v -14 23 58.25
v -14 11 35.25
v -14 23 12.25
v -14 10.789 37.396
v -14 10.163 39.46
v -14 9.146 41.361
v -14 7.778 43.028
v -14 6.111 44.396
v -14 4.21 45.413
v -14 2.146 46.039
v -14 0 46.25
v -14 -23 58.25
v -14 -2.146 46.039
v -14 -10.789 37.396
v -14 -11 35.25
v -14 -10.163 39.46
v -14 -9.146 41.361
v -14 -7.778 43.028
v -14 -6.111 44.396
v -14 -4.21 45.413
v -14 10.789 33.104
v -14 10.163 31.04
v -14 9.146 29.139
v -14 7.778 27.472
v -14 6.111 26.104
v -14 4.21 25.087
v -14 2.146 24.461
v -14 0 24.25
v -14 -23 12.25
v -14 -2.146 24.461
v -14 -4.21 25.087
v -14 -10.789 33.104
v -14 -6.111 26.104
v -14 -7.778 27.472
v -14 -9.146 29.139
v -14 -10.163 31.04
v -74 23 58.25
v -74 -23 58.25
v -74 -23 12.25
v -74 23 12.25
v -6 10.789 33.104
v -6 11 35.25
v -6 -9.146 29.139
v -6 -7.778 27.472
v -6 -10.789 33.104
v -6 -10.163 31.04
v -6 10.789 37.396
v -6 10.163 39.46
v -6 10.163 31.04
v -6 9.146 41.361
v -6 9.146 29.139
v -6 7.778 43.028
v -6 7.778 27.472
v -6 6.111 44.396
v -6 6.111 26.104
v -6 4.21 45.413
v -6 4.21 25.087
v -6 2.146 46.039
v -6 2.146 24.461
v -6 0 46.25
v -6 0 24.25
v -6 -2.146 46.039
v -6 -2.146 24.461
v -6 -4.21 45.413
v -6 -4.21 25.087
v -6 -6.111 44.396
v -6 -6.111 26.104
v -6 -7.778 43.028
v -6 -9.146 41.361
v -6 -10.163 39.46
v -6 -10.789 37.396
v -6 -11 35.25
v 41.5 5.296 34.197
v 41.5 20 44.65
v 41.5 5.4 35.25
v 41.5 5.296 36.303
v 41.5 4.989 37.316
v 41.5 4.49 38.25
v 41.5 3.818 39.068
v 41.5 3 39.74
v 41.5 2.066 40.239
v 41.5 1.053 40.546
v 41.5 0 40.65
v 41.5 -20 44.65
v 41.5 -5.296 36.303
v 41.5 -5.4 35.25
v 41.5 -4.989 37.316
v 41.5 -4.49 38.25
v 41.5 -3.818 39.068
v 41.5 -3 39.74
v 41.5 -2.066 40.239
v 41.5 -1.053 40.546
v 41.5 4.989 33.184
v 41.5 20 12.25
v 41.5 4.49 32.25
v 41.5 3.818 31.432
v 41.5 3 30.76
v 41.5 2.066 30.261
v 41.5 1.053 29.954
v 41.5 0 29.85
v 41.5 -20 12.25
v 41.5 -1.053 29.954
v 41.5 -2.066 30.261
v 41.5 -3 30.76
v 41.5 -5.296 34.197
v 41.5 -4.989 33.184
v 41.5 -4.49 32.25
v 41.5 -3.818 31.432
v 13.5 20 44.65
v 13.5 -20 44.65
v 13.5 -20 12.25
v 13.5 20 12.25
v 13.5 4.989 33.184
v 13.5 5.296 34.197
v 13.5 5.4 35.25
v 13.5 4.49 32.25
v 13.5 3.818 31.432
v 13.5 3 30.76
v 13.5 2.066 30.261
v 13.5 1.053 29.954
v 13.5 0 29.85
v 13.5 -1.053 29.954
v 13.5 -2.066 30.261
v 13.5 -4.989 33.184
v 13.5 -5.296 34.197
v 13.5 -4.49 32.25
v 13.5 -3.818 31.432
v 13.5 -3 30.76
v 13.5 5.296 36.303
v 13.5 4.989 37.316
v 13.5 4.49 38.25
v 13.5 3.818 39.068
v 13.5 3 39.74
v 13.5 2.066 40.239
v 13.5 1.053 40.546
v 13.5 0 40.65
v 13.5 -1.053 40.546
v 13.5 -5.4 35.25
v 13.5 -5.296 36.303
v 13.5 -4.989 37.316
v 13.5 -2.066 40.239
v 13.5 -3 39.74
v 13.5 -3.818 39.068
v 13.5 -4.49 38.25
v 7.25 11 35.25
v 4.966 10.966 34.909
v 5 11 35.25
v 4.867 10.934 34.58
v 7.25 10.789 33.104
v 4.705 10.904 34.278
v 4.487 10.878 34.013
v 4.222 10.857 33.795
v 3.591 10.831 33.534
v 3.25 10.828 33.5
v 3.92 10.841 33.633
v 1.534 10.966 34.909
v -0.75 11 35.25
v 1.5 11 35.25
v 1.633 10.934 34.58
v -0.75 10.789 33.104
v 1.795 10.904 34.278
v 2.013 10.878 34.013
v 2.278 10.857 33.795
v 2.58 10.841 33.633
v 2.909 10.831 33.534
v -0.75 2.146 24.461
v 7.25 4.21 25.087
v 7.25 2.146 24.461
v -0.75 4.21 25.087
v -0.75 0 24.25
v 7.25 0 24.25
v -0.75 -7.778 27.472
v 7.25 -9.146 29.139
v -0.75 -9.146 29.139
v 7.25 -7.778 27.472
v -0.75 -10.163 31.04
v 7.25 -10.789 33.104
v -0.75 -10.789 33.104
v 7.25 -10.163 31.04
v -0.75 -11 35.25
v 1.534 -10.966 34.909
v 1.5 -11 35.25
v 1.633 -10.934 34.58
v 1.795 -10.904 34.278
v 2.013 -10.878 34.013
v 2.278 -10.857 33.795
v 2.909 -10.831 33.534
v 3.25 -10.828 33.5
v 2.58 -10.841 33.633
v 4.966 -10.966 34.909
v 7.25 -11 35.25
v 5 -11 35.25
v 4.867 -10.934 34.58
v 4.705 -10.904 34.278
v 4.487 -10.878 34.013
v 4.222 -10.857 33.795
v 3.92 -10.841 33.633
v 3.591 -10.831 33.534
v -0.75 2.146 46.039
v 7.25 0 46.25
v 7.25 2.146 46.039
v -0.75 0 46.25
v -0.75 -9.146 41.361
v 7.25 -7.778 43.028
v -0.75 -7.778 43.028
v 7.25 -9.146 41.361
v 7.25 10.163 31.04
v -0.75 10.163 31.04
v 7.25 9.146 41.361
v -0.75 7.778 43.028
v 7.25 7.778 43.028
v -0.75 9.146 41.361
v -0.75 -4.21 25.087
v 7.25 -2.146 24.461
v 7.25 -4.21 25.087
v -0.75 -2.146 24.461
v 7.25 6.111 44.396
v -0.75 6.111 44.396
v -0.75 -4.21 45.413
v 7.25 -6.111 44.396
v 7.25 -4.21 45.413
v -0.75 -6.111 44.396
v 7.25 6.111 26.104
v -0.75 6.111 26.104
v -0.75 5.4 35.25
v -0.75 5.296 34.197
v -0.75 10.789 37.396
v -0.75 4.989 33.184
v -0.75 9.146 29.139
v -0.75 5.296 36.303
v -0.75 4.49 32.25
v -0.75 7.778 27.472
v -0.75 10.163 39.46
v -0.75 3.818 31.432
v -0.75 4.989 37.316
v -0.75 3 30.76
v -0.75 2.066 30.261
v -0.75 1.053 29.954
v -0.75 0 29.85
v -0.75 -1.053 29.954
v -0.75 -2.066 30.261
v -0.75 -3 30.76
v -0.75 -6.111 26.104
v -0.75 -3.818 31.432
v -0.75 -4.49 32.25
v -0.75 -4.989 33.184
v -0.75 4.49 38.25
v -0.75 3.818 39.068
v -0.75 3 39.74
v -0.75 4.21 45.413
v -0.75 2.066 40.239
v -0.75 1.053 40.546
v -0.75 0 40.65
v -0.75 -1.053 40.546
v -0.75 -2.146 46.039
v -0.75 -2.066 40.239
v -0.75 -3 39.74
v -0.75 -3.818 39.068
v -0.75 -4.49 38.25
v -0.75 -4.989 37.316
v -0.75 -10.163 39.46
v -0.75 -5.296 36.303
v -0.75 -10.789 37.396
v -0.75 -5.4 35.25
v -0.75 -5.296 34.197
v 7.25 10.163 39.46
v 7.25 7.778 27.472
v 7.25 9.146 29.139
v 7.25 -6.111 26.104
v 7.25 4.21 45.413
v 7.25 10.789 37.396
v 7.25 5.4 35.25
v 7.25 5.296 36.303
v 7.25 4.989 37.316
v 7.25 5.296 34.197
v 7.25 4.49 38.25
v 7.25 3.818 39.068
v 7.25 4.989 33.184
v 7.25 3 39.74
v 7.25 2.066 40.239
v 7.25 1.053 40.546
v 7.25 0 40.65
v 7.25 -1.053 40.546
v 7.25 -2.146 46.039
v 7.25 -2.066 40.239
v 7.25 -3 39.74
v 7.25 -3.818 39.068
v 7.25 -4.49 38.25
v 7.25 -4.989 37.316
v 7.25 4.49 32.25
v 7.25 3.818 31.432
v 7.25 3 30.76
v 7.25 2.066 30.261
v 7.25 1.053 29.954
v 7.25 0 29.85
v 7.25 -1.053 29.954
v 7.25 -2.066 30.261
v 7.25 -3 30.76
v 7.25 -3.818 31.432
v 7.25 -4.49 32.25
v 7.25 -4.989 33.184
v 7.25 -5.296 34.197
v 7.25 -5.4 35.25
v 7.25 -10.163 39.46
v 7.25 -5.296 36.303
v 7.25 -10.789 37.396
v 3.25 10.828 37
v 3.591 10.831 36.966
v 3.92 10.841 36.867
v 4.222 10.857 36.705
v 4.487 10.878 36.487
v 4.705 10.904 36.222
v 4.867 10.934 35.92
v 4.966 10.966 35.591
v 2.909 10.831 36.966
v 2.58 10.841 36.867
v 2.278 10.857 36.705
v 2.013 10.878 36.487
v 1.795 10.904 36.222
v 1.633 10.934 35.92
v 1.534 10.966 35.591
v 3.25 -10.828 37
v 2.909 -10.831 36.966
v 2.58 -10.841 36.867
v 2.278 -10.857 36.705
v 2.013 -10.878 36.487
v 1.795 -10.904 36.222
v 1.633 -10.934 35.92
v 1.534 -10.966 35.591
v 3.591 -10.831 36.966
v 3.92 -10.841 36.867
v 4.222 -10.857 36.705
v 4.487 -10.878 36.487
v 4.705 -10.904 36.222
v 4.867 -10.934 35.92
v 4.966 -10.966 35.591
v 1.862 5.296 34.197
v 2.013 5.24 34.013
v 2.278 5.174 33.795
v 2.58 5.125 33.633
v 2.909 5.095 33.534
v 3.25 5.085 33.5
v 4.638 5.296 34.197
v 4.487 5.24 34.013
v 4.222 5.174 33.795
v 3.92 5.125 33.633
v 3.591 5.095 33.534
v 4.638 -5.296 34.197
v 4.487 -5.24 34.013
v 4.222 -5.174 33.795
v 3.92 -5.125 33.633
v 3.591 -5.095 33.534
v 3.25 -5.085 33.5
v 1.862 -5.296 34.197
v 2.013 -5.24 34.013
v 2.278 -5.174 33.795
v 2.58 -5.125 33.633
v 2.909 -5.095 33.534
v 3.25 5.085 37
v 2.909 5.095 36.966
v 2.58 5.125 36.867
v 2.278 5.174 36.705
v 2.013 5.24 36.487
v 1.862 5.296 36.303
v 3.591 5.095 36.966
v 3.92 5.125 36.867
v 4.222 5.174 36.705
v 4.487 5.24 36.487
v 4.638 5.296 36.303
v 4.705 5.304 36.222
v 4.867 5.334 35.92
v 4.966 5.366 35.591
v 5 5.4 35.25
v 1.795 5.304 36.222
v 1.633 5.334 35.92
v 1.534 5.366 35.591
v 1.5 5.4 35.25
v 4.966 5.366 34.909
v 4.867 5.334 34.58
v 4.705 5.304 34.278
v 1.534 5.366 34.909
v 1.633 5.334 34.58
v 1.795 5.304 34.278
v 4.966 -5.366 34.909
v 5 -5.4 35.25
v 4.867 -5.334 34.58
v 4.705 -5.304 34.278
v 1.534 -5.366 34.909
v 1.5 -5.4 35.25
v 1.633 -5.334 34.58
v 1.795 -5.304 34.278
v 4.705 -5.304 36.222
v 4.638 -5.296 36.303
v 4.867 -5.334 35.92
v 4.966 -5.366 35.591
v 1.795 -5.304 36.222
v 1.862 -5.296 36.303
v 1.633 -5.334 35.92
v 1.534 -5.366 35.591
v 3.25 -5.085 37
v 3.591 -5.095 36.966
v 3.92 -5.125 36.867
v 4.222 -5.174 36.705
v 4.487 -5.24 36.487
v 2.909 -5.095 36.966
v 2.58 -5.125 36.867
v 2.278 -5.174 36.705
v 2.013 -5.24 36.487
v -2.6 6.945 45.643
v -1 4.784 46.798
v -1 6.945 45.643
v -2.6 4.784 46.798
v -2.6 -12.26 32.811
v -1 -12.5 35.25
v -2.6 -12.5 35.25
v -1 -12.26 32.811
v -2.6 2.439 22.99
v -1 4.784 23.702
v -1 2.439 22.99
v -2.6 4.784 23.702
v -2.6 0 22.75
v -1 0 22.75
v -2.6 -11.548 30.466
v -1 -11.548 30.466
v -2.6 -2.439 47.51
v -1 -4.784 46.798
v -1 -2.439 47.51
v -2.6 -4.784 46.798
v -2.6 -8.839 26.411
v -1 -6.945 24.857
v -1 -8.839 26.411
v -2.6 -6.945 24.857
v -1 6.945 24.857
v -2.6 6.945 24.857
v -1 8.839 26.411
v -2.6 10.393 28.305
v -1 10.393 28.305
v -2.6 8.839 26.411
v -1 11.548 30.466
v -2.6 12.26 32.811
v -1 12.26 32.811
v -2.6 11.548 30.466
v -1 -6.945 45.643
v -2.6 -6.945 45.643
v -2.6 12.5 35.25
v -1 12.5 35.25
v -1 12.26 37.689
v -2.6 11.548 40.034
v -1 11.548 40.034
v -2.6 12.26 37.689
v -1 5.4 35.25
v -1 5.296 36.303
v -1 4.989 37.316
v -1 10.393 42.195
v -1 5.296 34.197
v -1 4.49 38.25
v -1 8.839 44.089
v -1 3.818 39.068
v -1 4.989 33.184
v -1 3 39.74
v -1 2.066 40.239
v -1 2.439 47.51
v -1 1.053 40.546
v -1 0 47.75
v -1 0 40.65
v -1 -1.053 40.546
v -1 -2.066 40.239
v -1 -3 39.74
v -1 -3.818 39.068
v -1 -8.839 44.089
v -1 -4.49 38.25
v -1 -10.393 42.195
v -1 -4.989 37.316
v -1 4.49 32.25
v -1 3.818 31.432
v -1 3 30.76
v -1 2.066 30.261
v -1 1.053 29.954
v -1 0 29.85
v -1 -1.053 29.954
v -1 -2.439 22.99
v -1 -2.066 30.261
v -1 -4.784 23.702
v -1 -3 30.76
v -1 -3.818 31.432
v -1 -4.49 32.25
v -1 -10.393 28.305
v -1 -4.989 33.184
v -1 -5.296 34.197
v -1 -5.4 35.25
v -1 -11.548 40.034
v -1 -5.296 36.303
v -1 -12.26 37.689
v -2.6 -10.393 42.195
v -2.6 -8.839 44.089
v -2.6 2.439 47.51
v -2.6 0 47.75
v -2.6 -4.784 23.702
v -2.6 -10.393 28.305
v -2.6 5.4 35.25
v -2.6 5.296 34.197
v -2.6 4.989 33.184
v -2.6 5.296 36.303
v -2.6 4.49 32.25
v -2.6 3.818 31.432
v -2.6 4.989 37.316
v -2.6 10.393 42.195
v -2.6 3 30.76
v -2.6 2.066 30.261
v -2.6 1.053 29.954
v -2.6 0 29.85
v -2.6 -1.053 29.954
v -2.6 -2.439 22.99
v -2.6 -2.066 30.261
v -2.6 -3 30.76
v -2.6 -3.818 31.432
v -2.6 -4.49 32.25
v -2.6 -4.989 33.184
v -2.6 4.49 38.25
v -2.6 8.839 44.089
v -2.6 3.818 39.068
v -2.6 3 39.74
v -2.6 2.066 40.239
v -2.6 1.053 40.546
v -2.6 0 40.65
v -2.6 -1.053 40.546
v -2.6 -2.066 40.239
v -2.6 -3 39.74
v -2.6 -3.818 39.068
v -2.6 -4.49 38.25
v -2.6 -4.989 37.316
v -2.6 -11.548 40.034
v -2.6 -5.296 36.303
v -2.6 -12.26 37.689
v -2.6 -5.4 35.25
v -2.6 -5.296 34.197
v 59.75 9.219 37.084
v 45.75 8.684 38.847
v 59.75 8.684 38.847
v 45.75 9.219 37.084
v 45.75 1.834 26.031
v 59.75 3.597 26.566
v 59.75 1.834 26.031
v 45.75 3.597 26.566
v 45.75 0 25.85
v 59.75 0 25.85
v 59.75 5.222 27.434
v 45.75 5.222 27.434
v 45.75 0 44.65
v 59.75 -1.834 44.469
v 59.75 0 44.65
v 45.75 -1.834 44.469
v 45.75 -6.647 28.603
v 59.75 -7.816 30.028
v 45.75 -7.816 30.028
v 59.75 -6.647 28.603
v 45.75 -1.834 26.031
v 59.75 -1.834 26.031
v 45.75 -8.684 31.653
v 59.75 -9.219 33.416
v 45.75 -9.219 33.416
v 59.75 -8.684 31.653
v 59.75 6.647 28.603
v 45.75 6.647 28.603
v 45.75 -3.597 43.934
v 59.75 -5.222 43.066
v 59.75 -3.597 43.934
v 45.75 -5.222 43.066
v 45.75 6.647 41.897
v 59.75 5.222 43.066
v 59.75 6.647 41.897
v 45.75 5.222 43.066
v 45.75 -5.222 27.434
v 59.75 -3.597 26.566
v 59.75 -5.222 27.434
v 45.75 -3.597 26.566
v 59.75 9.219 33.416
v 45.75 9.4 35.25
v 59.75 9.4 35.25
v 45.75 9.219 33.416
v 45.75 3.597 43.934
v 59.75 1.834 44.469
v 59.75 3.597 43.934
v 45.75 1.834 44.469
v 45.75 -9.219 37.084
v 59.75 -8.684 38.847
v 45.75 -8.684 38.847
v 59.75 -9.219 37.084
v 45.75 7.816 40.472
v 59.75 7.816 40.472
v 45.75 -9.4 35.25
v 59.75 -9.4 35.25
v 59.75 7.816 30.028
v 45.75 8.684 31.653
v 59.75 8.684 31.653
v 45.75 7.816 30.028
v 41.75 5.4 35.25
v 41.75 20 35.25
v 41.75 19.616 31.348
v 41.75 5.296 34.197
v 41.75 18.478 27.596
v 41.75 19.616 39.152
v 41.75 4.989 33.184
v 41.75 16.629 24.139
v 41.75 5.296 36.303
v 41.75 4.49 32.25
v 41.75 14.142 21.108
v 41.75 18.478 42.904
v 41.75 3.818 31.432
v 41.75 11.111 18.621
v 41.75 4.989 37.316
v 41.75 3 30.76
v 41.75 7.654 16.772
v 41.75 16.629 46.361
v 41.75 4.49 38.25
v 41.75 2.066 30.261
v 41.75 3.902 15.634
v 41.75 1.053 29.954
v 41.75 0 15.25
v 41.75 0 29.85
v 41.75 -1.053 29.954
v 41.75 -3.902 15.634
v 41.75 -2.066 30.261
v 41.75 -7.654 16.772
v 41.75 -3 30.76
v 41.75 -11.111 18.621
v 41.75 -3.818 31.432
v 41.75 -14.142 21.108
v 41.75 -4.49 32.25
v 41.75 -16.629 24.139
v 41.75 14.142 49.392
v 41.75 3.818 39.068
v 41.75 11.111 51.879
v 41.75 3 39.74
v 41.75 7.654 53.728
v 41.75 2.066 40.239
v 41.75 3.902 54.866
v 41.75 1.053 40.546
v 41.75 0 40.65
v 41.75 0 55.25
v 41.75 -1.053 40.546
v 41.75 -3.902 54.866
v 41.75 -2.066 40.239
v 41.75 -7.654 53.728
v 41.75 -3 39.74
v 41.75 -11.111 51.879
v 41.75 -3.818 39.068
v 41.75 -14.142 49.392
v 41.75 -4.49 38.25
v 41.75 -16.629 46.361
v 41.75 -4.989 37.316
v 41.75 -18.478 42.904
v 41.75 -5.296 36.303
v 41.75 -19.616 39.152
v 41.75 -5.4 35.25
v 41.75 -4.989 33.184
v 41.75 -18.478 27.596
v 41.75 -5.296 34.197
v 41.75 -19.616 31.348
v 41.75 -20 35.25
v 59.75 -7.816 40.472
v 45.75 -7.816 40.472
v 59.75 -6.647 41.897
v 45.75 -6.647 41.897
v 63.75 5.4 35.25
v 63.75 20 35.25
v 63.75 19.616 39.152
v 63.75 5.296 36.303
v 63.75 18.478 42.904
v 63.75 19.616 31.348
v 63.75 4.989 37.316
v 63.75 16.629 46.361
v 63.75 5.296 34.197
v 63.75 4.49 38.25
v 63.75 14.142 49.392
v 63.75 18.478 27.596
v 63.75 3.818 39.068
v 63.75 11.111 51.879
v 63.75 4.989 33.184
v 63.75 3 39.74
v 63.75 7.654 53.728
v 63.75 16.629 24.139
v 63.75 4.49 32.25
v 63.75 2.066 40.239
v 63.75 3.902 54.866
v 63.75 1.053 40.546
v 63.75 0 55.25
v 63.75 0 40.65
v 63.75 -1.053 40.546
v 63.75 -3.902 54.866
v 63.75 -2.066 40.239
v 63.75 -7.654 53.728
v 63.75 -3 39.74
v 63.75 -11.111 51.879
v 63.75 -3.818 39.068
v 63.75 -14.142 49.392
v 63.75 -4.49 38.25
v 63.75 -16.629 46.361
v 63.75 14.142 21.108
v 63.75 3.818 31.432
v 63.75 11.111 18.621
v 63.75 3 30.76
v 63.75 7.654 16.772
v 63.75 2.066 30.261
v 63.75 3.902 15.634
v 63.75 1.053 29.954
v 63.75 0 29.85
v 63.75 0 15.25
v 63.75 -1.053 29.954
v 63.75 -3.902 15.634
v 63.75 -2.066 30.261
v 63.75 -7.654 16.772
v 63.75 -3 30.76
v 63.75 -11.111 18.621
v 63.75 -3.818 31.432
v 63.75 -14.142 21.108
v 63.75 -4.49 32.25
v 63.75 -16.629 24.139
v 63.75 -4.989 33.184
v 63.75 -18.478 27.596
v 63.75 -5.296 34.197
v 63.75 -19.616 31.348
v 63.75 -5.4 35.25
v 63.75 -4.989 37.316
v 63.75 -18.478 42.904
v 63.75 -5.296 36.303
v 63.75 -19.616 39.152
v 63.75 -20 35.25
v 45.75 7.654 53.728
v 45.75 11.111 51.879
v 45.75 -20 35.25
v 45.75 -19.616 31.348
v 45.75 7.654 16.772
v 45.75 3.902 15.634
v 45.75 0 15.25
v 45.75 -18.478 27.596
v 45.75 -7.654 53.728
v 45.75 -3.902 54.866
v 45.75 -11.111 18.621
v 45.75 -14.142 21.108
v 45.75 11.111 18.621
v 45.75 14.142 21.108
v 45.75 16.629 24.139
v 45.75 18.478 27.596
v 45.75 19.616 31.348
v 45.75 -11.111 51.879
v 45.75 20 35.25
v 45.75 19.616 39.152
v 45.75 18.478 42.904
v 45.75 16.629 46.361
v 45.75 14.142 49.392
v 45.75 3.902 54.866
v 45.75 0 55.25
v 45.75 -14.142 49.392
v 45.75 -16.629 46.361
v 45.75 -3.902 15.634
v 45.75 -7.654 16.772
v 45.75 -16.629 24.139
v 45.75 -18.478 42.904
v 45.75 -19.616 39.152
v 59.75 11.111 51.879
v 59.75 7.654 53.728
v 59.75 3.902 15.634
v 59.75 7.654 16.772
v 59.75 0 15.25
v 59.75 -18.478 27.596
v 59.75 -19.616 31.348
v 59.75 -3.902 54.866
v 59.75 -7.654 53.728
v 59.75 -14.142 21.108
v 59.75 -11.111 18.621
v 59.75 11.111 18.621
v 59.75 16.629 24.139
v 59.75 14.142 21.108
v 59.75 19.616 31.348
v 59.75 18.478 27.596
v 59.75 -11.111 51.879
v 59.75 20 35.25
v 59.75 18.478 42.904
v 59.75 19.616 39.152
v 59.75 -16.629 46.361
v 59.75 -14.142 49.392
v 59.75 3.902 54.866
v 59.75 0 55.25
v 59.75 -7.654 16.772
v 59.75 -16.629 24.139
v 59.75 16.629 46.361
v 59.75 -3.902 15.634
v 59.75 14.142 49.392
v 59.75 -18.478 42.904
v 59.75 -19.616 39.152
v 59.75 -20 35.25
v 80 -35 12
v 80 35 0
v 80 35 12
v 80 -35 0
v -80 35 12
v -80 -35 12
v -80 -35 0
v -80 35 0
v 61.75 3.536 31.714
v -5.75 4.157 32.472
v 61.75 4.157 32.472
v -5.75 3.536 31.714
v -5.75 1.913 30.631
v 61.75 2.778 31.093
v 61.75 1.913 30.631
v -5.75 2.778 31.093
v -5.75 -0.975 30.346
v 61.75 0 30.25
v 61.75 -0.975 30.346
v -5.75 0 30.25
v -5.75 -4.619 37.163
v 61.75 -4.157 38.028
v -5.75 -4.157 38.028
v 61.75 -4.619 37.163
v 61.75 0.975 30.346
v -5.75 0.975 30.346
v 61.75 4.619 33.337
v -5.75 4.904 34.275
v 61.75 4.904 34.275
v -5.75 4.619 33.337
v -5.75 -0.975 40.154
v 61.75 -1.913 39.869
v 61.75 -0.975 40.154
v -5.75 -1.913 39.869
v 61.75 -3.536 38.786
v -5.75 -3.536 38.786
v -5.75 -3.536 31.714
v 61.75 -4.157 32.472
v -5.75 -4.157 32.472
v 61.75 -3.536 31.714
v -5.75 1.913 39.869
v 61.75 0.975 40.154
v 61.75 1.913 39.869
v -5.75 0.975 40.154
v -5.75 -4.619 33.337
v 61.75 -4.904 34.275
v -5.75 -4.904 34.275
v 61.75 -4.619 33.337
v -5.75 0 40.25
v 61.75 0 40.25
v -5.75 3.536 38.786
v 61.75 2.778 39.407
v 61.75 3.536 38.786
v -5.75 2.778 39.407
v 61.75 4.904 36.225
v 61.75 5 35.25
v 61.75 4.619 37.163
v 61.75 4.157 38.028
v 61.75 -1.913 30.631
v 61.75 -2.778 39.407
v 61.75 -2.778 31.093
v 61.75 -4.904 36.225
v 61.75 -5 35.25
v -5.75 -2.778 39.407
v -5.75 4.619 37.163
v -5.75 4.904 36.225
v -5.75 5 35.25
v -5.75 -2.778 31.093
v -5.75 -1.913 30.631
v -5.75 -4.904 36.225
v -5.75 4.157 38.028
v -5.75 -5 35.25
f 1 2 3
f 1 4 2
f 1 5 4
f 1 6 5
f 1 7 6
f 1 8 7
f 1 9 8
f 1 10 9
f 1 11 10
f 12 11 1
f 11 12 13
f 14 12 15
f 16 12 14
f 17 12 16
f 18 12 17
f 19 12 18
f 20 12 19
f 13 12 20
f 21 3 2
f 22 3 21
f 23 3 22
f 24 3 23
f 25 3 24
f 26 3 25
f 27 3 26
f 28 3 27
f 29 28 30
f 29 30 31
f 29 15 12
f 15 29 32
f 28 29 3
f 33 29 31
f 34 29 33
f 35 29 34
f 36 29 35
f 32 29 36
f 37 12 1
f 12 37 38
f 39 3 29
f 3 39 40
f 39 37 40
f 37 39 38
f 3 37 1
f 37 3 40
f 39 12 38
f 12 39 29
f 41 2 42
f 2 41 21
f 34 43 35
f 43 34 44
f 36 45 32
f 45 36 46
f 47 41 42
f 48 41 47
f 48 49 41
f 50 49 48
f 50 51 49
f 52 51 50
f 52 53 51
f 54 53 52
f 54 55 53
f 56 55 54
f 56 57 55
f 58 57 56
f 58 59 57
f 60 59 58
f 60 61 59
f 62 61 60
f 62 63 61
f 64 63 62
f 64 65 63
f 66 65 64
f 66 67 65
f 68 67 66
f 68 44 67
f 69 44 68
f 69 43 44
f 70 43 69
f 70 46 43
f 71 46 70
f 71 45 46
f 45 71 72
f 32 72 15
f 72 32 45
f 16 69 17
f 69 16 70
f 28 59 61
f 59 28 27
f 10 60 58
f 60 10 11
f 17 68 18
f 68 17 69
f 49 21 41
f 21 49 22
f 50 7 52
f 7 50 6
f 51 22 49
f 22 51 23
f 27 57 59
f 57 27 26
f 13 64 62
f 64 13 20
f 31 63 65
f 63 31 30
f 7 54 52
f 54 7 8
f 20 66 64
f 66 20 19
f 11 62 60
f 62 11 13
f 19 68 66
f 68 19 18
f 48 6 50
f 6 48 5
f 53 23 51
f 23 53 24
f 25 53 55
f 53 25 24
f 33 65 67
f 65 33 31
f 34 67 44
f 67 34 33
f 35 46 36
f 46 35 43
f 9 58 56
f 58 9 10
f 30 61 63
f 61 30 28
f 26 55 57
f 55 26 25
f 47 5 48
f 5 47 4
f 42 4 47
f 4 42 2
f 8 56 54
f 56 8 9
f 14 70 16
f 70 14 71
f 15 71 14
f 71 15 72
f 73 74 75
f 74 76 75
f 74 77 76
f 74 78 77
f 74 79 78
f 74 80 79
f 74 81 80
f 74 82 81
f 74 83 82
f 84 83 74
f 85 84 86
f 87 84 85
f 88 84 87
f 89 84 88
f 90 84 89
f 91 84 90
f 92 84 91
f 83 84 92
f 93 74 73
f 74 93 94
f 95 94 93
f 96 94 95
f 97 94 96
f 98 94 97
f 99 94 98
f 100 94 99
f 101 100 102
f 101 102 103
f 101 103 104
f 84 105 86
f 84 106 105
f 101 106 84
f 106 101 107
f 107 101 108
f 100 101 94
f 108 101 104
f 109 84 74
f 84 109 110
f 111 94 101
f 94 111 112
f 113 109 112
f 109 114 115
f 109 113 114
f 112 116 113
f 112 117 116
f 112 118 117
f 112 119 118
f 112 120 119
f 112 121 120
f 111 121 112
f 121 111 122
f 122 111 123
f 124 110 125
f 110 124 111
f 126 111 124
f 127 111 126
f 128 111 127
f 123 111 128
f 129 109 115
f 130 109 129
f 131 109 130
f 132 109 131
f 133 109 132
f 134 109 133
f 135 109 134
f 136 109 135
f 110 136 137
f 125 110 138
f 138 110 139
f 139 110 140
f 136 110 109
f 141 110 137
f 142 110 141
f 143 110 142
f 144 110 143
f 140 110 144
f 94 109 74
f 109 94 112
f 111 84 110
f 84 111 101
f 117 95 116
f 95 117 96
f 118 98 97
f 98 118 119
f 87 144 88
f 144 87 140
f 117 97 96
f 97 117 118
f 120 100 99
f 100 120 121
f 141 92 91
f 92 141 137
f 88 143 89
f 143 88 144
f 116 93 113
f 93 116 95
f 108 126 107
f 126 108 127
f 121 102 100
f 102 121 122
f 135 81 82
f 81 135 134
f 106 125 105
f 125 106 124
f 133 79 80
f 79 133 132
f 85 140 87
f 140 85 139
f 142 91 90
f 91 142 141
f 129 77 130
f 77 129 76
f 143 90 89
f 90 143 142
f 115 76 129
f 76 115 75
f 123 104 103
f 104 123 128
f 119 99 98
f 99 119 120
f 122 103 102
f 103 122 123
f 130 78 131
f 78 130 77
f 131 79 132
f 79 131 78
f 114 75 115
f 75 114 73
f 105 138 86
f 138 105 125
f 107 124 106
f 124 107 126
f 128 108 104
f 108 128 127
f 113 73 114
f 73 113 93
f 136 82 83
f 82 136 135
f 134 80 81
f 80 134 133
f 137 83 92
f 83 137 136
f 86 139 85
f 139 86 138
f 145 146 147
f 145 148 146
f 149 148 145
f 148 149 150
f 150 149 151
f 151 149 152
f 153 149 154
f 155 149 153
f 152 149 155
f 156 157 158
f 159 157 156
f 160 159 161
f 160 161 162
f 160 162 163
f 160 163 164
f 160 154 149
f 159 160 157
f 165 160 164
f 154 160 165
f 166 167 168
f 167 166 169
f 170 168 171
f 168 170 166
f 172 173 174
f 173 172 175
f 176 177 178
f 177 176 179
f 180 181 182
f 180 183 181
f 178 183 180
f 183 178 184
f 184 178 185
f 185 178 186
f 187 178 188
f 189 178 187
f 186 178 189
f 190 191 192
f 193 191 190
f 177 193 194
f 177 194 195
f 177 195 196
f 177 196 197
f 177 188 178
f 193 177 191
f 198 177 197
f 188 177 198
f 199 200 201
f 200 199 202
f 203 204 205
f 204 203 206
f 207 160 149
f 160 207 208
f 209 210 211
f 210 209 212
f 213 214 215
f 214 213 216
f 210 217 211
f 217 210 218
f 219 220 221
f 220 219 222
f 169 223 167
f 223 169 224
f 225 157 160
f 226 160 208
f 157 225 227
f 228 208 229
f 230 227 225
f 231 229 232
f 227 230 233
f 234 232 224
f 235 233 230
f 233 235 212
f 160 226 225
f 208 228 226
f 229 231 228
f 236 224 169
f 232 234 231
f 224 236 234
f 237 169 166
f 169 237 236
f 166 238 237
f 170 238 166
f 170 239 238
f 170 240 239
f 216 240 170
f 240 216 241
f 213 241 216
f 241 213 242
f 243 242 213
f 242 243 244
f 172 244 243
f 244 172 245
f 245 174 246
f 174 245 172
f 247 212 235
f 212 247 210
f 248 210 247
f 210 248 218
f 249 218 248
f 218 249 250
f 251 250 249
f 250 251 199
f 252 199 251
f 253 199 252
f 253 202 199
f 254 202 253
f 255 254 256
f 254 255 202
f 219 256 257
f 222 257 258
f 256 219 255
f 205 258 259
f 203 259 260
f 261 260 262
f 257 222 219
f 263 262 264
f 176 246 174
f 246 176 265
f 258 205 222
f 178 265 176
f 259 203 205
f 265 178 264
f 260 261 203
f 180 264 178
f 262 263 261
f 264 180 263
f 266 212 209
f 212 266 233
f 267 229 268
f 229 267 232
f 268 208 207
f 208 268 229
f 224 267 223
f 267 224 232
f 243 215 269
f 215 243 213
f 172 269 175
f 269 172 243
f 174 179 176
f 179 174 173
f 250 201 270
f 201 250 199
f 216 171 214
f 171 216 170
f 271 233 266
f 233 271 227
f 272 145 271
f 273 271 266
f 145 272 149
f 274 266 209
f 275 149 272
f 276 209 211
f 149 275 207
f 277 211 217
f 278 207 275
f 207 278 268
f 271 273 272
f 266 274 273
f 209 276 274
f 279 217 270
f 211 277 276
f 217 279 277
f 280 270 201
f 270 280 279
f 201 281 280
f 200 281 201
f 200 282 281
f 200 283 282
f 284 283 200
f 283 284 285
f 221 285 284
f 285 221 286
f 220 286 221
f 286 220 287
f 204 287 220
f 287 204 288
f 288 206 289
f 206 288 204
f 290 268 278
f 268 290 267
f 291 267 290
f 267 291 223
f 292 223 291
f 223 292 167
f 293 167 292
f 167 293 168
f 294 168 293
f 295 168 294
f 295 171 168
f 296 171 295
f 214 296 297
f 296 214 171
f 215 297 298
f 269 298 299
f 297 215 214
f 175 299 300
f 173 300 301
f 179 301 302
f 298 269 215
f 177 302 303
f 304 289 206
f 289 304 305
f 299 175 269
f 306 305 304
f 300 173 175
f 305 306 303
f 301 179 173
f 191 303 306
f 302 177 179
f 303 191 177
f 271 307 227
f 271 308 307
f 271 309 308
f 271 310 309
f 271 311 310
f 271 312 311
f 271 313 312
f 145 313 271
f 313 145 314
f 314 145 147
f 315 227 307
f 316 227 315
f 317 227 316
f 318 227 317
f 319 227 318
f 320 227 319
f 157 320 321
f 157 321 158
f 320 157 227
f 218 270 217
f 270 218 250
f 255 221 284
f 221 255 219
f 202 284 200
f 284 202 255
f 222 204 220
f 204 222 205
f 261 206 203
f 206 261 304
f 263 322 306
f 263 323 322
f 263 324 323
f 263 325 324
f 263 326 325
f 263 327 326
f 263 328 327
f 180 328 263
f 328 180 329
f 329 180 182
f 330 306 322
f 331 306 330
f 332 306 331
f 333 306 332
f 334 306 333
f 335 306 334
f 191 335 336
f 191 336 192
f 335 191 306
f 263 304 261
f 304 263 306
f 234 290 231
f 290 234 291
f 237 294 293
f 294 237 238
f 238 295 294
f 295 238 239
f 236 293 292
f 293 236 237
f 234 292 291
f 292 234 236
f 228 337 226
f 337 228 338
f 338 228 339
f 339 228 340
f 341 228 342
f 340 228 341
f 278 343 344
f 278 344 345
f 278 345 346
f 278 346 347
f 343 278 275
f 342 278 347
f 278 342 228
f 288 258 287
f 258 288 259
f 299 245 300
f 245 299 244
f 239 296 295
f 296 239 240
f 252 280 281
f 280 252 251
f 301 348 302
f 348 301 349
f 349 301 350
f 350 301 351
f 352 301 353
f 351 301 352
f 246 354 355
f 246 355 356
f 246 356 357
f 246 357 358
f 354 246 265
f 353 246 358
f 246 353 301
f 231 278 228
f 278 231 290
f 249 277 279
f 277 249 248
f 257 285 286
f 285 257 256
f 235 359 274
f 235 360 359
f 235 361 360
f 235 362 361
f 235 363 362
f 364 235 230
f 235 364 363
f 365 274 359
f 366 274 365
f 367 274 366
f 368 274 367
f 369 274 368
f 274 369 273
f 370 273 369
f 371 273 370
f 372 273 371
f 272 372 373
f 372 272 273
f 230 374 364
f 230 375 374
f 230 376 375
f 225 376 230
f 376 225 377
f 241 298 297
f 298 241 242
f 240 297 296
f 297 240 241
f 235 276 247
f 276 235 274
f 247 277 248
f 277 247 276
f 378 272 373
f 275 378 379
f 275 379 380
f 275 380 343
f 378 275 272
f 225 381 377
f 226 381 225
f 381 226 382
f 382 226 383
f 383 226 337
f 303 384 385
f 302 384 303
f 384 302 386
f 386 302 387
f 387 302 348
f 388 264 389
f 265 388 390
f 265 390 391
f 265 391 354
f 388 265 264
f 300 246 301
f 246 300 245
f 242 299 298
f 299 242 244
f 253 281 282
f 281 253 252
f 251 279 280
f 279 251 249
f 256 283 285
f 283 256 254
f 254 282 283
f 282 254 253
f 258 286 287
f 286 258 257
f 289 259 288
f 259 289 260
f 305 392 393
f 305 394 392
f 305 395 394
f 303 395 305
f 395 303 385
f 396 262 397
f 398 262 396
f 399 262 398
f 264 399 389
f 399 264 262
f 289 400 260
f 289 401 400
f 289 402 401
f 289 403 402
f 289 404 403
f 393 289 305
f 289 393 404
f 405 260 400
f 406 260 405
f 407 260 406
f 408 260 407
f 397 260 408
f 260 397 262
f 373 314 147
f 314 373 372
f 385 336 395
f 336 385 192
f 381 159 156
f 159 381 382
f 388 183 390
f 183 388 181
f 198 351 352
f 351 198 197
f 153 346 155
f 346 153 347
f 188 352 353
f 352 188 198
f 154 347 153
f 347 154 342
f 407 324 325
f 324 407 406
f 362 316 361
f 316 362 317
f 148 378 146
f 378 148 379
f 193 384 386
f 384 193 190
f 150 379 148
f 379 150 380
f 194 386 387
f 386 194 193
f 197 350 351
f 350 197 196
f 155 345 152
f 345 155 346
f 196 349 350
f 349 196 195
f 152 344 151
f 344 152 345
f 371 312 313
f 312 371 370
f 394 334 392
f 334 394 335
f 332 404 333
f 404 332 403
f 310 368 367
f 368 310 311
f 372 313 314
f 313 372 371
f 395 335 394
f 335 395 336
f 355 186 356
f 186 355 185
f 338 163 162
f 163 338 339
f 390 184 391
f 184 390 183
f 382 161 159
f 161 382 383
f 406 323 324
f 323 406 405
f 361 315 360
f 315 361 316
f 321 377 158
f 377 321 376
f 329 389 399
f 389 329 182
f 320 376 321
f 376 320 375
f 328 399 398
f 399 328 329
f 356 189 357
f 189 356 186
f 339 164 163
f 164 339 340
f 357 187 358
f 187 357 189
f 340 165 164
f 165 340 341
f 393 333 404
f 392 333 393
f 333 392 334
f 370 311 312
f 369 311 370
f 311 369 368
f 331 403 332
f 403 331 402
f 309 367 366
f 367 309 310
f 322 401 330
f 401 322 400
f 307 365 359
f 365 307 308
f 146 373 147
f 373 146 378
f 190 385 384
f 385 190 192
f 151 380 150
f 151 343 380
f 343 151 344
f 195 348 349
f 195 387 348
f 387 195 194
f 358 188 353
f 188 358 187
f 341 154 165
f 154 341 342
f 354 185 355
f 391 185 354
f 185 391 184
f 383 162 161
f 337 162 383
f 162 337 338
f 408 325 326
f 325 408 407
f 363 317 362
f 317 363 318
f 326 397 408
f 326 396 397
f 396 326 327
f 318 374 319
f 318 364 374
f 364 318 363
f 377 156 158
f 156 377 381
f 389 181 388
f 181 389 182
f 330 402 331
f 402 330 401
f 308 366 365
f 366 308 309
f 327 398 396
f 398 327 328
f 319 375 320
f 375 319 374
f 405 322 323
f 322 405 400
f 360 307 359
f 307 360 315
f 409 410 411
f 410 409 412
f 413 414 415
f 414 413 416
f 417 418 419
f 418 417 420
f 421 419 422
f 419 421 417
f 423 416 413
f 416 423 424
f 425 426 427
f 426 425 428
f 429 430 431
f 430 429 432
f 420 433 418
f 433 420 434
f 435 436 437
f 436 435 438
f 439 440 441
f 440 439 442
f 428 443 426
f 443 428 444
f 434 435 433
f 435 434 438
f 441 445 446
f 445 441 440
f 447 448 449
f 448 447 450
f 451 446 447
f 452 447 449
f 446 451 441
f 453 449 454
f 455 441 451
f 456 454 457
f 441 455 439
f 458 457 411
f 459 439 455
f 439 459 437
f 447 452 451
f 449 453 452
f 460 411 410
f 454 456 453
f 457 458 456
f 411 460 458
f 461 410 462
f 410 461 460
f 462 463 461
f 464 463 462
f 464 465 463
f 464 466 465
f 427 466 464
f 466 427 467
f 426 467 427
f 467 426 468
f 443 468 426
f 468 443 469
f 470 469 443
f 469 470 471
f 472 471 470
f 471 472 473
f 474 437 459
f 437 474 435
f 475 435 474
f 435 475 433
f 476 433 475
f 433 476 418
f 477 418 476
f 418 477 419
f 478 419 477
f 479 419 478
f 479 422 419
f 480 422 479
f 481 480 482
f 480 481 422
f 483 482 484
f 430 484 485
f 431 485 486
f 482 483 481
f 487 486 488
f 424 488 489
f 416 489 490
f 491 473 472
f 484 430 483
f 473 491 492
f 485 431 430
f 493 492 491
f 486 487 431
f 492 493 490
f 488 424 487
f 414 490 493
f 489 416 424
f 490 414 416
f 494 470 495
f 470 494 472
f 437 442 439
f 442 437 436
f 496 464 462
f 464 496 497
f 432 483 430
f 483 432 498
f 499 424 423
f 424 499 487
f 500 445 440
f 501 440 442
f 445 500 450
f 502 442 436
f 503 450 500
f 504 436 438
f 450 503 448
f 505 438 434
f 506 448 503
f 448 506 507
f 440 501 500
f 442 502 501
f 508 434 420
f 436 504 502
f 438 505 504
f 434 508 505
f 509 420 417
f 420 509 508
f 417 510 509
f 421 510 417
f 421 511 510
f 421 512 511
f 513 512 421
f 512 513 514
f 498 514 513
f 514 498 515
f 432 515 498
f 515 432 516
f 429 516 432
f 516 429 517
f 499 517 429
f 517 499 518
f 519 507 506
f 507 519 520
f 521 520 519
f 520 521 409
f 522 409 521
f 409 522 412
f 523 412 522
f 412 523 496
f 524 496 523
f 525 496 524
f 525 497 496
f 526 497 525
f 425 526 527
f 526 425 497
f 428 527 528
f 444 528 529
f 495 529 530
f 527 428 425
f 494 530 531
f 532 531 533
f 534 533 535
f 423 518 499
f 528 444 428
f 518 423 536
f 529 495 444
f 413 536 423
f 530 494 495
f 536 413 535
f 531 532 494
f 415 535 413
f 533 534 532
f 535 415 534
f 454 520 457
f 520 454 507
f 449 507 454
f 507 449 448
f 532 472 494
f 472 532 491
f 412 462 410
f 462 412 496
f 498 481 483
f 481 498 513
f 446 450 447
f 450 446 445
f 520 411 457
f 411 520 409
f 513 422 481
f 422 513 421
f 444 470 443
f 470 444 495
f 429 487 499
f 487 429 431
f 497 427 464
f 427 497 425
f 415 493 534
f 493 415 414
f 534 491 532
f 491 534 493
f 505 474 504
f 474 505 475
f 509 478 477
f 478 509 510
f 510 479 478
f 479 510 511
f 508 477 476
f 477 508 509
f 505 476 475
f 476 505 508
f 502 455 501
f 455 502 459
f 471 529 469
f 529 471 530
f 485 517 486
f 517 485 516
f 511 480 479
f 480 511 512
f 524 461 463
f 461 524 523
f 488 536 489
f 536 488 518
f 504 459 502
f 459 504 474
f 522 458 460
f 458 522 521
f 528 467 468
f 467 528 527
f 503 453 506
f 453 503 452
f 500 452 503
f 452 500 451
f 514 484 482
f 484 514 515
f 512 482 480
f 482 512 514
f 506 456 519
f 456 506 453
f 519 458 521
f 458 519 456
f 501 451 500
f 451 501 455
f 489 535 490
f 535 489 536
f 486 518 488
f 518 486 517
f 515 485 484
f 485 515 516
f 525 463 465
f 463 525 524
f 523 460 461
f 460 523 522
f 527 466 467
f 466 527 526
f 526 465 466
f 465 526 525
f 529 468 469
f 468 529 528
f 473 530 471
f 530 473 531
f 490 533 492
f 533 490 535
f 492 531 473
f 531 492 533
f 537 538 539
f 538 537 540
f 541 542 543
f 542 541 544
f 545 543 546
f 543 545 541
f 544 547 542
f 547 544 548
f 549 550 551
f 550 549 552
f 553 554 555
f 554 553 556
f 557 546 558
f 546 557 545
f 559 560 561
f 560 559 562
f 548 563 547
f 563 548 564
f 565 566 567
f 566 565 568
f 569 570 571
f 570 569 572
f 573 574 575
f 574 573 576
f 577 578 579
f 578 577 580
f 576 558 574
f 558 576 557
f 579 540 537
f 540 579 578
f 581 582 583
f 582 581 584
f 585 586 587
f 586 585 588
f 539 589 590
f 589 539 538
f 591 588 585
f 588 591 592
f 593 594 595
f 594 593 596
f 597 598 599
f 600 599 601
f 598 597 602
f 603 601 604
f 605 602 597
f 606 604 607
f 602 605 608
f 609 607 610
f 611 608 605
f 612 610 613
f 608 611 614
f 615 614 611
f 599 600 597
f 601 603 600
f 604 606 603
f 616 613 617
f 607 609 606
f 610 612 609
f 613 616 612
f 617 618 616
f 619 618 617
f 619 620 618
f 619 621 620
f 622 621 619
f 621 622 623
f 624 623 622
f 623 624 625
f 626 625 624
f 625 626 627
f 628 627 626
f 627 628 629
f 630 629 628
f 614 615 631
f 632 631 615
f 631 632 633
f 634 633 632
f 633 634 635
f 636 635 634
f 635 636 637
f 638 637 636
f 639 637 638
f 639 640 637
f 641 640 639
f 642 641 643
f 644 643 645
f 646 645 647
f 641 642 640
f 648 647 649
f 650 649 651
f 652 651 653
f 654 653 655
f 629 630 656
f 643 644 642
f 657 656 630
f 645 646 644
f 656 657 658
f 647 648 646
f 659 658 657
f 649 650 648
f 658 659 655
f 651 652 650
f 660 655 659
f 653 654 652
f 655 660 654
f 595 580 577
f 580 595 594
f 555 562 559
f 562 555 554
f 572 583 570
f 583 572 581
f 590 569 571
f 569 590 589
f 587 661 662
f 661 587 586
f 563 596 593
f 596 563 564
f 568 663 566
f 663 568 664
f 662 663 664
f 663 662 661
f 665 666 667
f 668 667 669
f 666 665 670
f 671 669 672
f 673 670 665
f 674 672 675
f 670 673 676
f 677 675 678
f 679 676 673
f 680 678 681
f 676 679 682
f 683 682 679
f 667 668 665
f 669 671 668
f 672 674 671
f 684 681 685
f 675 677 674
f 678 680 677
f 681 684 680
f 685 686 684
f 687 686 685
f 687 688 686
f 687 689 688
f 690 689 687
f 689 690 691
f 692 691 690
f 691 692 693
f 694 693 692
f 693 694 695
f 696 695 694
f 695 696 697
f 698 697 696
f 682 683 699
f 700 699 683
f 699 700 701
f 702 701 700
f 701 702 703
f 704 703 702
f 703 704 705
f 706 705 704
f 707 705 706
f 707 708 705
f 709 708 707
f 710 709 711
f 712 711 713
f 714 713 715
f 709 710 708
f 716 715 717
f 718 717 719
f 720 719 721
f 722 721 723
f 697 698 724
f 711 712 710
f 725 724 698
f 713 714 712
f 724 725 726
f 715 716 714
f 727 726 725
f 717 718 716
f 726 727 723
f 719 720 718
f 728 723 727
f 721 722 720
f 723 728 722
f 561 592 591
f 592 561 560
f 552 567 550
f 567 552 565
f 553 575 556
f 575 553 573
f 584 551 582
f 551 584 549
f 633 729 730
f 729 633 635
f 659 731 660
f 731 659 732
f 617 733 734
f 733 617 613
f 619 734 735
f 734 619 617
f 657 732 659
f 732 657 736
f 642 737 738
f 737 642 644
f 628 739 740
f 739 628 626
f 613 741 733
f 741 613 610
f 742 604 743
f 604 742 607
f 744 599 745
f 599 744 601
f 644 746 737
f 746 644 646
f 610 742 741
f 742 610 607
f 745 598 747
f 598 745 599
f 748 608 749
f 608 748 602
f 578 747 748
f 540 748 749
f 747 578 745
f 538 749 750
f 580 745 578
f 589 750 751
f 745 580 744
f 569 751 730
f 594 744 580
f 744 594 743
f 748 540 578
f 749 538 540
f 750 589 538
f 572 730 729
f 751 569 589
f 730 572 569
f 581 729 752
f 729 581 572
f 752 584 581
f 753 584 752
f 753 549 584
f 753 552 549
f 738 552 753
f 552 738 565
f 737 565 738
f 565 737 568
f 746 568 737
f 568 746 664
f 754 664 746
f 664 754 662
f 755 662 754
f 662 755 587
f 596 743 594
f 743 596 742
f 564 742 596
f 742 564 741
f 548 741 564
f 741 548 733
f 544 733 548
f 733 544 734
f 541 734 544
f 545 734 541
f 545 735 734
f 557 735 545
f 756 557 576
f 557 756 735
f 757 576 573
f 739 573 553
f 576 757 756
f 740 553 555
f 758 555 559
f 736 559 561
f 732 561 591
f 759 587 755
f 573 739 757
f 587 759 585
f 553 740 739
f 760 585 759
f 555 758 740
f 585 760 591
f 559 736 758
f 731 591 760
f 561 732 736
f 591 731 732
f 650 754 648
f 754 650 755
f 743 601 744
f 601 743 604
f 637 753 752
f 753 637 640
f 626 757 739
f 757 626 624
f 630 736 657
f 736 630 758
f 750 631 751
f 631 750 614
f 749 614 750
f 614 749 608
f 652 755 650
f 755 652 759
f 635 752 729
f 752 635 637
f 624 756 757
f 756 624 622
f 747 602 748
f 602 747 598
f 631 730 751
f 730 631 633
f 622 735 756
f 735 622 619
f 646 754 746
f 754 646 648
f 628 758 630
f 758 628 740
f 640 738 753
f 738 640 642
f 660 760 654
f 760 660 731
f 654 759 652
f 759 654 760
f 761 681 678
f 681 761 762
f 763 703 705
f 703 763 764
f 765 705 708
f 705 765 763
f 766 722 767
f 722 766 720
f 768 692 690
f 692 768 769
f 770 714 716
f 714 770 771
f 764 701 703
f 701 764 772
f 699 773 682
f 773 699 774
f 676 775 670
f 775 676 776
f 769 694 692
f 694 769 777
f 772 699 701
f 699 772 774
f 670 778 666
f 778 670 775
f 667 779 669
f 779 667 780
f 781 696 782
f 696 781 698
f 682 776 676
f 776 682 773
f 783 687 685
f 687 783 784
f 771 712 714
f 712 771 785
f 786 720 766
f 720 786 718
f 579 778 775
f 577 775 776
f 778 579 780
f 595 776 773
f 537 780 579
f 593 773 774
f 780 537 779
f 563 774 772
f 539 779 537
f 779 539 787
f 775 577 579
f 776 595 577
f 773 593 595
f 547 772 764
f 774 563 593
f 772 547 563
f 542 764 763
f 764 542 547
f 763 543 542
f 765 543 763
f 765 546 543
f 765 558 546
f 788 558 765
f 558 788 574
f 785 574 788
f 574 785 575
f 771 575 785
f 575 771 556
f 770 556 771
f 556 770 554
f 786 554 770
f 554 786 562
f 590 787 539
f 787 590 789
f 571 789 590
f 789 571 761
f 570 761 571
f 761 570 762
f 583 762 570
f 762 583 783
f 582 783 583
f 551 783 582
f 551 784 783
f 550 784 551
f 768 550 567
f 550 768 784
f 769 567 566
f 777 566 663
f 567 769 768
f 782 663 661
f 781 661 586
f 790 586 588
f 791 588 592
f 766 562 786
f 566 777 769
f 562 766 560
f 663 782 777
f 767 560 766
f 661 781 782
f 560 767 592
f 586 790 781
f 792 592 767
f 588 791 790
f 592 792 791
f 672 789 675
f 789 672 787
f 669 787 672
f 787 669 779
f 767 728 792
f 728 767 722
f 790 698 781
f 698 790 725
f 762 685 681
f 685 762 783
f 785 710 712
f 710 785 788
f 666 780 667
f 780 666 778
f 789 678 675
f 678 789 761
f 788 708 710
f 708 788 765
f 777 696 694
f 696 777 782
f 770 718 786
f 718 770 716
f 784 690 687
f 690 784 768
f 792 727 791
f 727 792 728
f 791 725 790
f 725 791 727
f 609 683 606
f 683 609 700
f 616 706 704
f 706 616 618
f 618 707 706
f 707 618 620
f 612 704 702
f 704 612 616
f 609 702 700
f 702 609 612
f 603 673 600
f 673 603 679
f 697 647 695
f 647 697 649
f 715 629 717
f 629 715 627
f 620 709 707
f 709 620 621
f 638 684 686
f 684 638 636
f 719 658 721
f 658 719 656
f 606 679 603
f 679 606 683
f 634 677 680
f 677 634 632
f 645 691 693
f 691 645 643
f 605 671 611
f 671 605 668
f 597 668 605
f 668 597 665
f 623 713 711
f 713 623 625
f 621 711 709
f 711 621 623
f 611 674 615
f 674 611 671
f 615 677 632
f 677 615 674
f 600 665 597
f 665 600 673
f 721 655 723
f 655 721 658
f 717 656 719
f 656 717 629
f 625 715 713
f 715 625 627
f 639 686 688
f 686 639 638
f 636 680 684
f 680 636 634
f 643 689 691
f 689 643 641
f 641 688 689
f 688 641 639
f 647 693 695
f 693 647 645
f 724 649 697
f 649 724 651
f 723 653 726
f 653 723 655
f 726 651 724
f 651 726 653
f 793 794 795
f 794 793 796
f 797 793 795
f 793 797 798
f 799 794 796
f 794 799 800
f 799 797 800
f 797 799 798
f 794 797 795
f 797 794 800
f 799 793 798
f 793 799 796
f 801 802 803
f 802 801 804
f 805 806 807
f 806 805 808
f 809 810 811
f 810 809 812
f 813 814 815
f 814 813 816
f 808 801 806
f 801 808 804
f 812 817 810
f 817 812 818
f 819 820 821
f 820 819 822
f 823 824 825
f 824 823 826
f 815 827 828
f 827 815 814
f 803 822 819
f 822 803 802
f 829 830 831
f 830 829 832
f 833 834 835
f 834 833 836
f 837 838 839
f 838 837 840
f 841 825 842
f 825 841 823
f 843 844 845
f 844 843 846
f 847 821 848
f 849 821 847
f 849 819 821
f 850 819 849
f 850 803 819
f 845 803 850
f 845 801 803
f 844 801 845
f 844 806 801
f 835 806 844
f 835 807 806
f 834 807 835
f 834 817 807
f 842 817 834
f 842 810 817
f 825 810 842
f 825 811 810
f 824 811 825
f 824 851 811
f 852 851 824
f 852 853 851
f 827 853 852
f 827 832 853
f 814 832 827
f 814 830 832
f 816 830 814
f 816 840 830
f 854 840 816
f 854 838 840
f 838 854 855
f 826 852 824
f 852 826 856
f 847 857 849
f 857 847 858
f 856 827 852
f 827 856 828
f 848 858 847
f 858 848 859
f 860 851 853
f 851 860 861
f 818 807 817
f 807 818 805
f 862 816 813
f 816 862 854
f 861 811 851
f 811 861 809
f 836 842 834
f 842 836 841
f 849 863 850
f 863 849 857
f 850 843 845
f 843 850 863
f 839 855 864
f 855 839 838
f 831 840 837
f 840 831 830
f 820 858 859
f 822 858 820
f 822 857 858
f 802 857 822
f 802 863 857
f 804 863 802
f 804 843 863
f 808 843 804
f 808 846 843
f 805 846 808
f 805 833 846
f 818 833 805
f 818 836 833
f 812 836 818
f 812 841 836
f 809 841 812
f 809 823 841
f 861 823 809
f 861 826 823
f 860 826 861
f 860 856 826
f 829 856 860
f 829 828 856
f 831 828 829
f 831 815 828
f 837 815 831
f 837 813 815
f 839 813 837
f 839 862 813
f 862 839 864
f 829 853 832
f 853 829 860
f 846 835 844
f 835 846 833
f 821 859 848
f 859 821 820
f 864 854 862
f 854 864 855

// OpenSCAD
$fn = 32;

// ------------------------------------------------------------------------
// Motor drive station: motor 60 x 46 mm, shaft d10, pulley d40
// Every part is its own module, assembly() places every instance.
// ------------------------------------------------------------------------

// --- part 1 ---
module station_bed() {
  difference() {
    translate([-80, -35, 0]) cube([160, 70, 12]);
  }
}

// --- part 2 ---
module drive_motor() {
  union() {
    translate([-30, -23, 0]) cube([60, 46, 46]);
    translate([34, 0, 23]) rotate([0, 90, 0]) cylinder(h = 8, d = 22, center = true);
  }
}

// --- part 3 ---
module pillow_block() {
  difference() {
    translate([-14, -20, 0]) cube([28, 40, 32.4]);
    translate([0, 0, 23]) rotate([0, 90, 0]) cylinder(h = 30, d = 10.8, center = true);
  }
}

// --- part 4 ---
module drive_shaft() {
  translate([0, 0, -33.75]) cylinder(h = 67.5, d = 10);
}

// --- part 5 ---
module shaft_collar() {
  difference() {
    cylinder(h = 8, d = 22);
    translate([0, 0, -1]) cylinder(h = 10, d = 10.8);
    translate([0, 0, 4]) rotate([90, 0, 0]) cylinder(h = 24, d = 3.5, center = true);
  }
}

// --- part 6 ---
module collar_washer() {
  difference() {
      translate([0, 0, 0]) cylinder(h = 1.6, d = 25);
      translate([0, 0, -1]) cylinder(h = 3.6, d = 10.8);
    }
}

// --- part 7 ---
module drive_pulley() {
  difference() {
    union() {
      cylinder(h = 22, d = 18.8);
      cylinder(h = 4, d = 40);
      translate([0, 0, 18]) cylinder(h = 4, d = 40);
    }
    translate([0, 0, -1]) cylinder(h = 24, d = 10.8);
  }
}

// --- assembly ---
module assembly() {
  color([0.80, 0.24, 0.20]) translate([0, 0, 0]) rotate([0, 0, 0]) station_bed();
  color([0.20, 0.45, 0.75]) translate([-44, 0, 12.25]) rotate([0, 0, 0]) drive_motor();
  color([0.25, 0.62, 0.32]) translate([27.5, 0, 12.25]) rotate([0, 0, 0]) pillow_block();
  color([0.92, 0.70, 0.18]) translate([28, 0, 35.25]) rotate([0, 90, 0]) drive_shaft();
  color([0.58, 0.35, 0.70]) translate([-0.75, 0, 35.25]) rotate([0, 90, 0]) shaft_collar();
  color([0.16, 0.66, 0.66]) translate([-2.6, 0, 35.25]) rotate([0, 90, 0]) collar_washer();
  color([0.85, 0.48, 0.18]) translate([41.75, 0, 35.25]) rotate([0, 90, 0]) drive_pulley();
}

assembly();
